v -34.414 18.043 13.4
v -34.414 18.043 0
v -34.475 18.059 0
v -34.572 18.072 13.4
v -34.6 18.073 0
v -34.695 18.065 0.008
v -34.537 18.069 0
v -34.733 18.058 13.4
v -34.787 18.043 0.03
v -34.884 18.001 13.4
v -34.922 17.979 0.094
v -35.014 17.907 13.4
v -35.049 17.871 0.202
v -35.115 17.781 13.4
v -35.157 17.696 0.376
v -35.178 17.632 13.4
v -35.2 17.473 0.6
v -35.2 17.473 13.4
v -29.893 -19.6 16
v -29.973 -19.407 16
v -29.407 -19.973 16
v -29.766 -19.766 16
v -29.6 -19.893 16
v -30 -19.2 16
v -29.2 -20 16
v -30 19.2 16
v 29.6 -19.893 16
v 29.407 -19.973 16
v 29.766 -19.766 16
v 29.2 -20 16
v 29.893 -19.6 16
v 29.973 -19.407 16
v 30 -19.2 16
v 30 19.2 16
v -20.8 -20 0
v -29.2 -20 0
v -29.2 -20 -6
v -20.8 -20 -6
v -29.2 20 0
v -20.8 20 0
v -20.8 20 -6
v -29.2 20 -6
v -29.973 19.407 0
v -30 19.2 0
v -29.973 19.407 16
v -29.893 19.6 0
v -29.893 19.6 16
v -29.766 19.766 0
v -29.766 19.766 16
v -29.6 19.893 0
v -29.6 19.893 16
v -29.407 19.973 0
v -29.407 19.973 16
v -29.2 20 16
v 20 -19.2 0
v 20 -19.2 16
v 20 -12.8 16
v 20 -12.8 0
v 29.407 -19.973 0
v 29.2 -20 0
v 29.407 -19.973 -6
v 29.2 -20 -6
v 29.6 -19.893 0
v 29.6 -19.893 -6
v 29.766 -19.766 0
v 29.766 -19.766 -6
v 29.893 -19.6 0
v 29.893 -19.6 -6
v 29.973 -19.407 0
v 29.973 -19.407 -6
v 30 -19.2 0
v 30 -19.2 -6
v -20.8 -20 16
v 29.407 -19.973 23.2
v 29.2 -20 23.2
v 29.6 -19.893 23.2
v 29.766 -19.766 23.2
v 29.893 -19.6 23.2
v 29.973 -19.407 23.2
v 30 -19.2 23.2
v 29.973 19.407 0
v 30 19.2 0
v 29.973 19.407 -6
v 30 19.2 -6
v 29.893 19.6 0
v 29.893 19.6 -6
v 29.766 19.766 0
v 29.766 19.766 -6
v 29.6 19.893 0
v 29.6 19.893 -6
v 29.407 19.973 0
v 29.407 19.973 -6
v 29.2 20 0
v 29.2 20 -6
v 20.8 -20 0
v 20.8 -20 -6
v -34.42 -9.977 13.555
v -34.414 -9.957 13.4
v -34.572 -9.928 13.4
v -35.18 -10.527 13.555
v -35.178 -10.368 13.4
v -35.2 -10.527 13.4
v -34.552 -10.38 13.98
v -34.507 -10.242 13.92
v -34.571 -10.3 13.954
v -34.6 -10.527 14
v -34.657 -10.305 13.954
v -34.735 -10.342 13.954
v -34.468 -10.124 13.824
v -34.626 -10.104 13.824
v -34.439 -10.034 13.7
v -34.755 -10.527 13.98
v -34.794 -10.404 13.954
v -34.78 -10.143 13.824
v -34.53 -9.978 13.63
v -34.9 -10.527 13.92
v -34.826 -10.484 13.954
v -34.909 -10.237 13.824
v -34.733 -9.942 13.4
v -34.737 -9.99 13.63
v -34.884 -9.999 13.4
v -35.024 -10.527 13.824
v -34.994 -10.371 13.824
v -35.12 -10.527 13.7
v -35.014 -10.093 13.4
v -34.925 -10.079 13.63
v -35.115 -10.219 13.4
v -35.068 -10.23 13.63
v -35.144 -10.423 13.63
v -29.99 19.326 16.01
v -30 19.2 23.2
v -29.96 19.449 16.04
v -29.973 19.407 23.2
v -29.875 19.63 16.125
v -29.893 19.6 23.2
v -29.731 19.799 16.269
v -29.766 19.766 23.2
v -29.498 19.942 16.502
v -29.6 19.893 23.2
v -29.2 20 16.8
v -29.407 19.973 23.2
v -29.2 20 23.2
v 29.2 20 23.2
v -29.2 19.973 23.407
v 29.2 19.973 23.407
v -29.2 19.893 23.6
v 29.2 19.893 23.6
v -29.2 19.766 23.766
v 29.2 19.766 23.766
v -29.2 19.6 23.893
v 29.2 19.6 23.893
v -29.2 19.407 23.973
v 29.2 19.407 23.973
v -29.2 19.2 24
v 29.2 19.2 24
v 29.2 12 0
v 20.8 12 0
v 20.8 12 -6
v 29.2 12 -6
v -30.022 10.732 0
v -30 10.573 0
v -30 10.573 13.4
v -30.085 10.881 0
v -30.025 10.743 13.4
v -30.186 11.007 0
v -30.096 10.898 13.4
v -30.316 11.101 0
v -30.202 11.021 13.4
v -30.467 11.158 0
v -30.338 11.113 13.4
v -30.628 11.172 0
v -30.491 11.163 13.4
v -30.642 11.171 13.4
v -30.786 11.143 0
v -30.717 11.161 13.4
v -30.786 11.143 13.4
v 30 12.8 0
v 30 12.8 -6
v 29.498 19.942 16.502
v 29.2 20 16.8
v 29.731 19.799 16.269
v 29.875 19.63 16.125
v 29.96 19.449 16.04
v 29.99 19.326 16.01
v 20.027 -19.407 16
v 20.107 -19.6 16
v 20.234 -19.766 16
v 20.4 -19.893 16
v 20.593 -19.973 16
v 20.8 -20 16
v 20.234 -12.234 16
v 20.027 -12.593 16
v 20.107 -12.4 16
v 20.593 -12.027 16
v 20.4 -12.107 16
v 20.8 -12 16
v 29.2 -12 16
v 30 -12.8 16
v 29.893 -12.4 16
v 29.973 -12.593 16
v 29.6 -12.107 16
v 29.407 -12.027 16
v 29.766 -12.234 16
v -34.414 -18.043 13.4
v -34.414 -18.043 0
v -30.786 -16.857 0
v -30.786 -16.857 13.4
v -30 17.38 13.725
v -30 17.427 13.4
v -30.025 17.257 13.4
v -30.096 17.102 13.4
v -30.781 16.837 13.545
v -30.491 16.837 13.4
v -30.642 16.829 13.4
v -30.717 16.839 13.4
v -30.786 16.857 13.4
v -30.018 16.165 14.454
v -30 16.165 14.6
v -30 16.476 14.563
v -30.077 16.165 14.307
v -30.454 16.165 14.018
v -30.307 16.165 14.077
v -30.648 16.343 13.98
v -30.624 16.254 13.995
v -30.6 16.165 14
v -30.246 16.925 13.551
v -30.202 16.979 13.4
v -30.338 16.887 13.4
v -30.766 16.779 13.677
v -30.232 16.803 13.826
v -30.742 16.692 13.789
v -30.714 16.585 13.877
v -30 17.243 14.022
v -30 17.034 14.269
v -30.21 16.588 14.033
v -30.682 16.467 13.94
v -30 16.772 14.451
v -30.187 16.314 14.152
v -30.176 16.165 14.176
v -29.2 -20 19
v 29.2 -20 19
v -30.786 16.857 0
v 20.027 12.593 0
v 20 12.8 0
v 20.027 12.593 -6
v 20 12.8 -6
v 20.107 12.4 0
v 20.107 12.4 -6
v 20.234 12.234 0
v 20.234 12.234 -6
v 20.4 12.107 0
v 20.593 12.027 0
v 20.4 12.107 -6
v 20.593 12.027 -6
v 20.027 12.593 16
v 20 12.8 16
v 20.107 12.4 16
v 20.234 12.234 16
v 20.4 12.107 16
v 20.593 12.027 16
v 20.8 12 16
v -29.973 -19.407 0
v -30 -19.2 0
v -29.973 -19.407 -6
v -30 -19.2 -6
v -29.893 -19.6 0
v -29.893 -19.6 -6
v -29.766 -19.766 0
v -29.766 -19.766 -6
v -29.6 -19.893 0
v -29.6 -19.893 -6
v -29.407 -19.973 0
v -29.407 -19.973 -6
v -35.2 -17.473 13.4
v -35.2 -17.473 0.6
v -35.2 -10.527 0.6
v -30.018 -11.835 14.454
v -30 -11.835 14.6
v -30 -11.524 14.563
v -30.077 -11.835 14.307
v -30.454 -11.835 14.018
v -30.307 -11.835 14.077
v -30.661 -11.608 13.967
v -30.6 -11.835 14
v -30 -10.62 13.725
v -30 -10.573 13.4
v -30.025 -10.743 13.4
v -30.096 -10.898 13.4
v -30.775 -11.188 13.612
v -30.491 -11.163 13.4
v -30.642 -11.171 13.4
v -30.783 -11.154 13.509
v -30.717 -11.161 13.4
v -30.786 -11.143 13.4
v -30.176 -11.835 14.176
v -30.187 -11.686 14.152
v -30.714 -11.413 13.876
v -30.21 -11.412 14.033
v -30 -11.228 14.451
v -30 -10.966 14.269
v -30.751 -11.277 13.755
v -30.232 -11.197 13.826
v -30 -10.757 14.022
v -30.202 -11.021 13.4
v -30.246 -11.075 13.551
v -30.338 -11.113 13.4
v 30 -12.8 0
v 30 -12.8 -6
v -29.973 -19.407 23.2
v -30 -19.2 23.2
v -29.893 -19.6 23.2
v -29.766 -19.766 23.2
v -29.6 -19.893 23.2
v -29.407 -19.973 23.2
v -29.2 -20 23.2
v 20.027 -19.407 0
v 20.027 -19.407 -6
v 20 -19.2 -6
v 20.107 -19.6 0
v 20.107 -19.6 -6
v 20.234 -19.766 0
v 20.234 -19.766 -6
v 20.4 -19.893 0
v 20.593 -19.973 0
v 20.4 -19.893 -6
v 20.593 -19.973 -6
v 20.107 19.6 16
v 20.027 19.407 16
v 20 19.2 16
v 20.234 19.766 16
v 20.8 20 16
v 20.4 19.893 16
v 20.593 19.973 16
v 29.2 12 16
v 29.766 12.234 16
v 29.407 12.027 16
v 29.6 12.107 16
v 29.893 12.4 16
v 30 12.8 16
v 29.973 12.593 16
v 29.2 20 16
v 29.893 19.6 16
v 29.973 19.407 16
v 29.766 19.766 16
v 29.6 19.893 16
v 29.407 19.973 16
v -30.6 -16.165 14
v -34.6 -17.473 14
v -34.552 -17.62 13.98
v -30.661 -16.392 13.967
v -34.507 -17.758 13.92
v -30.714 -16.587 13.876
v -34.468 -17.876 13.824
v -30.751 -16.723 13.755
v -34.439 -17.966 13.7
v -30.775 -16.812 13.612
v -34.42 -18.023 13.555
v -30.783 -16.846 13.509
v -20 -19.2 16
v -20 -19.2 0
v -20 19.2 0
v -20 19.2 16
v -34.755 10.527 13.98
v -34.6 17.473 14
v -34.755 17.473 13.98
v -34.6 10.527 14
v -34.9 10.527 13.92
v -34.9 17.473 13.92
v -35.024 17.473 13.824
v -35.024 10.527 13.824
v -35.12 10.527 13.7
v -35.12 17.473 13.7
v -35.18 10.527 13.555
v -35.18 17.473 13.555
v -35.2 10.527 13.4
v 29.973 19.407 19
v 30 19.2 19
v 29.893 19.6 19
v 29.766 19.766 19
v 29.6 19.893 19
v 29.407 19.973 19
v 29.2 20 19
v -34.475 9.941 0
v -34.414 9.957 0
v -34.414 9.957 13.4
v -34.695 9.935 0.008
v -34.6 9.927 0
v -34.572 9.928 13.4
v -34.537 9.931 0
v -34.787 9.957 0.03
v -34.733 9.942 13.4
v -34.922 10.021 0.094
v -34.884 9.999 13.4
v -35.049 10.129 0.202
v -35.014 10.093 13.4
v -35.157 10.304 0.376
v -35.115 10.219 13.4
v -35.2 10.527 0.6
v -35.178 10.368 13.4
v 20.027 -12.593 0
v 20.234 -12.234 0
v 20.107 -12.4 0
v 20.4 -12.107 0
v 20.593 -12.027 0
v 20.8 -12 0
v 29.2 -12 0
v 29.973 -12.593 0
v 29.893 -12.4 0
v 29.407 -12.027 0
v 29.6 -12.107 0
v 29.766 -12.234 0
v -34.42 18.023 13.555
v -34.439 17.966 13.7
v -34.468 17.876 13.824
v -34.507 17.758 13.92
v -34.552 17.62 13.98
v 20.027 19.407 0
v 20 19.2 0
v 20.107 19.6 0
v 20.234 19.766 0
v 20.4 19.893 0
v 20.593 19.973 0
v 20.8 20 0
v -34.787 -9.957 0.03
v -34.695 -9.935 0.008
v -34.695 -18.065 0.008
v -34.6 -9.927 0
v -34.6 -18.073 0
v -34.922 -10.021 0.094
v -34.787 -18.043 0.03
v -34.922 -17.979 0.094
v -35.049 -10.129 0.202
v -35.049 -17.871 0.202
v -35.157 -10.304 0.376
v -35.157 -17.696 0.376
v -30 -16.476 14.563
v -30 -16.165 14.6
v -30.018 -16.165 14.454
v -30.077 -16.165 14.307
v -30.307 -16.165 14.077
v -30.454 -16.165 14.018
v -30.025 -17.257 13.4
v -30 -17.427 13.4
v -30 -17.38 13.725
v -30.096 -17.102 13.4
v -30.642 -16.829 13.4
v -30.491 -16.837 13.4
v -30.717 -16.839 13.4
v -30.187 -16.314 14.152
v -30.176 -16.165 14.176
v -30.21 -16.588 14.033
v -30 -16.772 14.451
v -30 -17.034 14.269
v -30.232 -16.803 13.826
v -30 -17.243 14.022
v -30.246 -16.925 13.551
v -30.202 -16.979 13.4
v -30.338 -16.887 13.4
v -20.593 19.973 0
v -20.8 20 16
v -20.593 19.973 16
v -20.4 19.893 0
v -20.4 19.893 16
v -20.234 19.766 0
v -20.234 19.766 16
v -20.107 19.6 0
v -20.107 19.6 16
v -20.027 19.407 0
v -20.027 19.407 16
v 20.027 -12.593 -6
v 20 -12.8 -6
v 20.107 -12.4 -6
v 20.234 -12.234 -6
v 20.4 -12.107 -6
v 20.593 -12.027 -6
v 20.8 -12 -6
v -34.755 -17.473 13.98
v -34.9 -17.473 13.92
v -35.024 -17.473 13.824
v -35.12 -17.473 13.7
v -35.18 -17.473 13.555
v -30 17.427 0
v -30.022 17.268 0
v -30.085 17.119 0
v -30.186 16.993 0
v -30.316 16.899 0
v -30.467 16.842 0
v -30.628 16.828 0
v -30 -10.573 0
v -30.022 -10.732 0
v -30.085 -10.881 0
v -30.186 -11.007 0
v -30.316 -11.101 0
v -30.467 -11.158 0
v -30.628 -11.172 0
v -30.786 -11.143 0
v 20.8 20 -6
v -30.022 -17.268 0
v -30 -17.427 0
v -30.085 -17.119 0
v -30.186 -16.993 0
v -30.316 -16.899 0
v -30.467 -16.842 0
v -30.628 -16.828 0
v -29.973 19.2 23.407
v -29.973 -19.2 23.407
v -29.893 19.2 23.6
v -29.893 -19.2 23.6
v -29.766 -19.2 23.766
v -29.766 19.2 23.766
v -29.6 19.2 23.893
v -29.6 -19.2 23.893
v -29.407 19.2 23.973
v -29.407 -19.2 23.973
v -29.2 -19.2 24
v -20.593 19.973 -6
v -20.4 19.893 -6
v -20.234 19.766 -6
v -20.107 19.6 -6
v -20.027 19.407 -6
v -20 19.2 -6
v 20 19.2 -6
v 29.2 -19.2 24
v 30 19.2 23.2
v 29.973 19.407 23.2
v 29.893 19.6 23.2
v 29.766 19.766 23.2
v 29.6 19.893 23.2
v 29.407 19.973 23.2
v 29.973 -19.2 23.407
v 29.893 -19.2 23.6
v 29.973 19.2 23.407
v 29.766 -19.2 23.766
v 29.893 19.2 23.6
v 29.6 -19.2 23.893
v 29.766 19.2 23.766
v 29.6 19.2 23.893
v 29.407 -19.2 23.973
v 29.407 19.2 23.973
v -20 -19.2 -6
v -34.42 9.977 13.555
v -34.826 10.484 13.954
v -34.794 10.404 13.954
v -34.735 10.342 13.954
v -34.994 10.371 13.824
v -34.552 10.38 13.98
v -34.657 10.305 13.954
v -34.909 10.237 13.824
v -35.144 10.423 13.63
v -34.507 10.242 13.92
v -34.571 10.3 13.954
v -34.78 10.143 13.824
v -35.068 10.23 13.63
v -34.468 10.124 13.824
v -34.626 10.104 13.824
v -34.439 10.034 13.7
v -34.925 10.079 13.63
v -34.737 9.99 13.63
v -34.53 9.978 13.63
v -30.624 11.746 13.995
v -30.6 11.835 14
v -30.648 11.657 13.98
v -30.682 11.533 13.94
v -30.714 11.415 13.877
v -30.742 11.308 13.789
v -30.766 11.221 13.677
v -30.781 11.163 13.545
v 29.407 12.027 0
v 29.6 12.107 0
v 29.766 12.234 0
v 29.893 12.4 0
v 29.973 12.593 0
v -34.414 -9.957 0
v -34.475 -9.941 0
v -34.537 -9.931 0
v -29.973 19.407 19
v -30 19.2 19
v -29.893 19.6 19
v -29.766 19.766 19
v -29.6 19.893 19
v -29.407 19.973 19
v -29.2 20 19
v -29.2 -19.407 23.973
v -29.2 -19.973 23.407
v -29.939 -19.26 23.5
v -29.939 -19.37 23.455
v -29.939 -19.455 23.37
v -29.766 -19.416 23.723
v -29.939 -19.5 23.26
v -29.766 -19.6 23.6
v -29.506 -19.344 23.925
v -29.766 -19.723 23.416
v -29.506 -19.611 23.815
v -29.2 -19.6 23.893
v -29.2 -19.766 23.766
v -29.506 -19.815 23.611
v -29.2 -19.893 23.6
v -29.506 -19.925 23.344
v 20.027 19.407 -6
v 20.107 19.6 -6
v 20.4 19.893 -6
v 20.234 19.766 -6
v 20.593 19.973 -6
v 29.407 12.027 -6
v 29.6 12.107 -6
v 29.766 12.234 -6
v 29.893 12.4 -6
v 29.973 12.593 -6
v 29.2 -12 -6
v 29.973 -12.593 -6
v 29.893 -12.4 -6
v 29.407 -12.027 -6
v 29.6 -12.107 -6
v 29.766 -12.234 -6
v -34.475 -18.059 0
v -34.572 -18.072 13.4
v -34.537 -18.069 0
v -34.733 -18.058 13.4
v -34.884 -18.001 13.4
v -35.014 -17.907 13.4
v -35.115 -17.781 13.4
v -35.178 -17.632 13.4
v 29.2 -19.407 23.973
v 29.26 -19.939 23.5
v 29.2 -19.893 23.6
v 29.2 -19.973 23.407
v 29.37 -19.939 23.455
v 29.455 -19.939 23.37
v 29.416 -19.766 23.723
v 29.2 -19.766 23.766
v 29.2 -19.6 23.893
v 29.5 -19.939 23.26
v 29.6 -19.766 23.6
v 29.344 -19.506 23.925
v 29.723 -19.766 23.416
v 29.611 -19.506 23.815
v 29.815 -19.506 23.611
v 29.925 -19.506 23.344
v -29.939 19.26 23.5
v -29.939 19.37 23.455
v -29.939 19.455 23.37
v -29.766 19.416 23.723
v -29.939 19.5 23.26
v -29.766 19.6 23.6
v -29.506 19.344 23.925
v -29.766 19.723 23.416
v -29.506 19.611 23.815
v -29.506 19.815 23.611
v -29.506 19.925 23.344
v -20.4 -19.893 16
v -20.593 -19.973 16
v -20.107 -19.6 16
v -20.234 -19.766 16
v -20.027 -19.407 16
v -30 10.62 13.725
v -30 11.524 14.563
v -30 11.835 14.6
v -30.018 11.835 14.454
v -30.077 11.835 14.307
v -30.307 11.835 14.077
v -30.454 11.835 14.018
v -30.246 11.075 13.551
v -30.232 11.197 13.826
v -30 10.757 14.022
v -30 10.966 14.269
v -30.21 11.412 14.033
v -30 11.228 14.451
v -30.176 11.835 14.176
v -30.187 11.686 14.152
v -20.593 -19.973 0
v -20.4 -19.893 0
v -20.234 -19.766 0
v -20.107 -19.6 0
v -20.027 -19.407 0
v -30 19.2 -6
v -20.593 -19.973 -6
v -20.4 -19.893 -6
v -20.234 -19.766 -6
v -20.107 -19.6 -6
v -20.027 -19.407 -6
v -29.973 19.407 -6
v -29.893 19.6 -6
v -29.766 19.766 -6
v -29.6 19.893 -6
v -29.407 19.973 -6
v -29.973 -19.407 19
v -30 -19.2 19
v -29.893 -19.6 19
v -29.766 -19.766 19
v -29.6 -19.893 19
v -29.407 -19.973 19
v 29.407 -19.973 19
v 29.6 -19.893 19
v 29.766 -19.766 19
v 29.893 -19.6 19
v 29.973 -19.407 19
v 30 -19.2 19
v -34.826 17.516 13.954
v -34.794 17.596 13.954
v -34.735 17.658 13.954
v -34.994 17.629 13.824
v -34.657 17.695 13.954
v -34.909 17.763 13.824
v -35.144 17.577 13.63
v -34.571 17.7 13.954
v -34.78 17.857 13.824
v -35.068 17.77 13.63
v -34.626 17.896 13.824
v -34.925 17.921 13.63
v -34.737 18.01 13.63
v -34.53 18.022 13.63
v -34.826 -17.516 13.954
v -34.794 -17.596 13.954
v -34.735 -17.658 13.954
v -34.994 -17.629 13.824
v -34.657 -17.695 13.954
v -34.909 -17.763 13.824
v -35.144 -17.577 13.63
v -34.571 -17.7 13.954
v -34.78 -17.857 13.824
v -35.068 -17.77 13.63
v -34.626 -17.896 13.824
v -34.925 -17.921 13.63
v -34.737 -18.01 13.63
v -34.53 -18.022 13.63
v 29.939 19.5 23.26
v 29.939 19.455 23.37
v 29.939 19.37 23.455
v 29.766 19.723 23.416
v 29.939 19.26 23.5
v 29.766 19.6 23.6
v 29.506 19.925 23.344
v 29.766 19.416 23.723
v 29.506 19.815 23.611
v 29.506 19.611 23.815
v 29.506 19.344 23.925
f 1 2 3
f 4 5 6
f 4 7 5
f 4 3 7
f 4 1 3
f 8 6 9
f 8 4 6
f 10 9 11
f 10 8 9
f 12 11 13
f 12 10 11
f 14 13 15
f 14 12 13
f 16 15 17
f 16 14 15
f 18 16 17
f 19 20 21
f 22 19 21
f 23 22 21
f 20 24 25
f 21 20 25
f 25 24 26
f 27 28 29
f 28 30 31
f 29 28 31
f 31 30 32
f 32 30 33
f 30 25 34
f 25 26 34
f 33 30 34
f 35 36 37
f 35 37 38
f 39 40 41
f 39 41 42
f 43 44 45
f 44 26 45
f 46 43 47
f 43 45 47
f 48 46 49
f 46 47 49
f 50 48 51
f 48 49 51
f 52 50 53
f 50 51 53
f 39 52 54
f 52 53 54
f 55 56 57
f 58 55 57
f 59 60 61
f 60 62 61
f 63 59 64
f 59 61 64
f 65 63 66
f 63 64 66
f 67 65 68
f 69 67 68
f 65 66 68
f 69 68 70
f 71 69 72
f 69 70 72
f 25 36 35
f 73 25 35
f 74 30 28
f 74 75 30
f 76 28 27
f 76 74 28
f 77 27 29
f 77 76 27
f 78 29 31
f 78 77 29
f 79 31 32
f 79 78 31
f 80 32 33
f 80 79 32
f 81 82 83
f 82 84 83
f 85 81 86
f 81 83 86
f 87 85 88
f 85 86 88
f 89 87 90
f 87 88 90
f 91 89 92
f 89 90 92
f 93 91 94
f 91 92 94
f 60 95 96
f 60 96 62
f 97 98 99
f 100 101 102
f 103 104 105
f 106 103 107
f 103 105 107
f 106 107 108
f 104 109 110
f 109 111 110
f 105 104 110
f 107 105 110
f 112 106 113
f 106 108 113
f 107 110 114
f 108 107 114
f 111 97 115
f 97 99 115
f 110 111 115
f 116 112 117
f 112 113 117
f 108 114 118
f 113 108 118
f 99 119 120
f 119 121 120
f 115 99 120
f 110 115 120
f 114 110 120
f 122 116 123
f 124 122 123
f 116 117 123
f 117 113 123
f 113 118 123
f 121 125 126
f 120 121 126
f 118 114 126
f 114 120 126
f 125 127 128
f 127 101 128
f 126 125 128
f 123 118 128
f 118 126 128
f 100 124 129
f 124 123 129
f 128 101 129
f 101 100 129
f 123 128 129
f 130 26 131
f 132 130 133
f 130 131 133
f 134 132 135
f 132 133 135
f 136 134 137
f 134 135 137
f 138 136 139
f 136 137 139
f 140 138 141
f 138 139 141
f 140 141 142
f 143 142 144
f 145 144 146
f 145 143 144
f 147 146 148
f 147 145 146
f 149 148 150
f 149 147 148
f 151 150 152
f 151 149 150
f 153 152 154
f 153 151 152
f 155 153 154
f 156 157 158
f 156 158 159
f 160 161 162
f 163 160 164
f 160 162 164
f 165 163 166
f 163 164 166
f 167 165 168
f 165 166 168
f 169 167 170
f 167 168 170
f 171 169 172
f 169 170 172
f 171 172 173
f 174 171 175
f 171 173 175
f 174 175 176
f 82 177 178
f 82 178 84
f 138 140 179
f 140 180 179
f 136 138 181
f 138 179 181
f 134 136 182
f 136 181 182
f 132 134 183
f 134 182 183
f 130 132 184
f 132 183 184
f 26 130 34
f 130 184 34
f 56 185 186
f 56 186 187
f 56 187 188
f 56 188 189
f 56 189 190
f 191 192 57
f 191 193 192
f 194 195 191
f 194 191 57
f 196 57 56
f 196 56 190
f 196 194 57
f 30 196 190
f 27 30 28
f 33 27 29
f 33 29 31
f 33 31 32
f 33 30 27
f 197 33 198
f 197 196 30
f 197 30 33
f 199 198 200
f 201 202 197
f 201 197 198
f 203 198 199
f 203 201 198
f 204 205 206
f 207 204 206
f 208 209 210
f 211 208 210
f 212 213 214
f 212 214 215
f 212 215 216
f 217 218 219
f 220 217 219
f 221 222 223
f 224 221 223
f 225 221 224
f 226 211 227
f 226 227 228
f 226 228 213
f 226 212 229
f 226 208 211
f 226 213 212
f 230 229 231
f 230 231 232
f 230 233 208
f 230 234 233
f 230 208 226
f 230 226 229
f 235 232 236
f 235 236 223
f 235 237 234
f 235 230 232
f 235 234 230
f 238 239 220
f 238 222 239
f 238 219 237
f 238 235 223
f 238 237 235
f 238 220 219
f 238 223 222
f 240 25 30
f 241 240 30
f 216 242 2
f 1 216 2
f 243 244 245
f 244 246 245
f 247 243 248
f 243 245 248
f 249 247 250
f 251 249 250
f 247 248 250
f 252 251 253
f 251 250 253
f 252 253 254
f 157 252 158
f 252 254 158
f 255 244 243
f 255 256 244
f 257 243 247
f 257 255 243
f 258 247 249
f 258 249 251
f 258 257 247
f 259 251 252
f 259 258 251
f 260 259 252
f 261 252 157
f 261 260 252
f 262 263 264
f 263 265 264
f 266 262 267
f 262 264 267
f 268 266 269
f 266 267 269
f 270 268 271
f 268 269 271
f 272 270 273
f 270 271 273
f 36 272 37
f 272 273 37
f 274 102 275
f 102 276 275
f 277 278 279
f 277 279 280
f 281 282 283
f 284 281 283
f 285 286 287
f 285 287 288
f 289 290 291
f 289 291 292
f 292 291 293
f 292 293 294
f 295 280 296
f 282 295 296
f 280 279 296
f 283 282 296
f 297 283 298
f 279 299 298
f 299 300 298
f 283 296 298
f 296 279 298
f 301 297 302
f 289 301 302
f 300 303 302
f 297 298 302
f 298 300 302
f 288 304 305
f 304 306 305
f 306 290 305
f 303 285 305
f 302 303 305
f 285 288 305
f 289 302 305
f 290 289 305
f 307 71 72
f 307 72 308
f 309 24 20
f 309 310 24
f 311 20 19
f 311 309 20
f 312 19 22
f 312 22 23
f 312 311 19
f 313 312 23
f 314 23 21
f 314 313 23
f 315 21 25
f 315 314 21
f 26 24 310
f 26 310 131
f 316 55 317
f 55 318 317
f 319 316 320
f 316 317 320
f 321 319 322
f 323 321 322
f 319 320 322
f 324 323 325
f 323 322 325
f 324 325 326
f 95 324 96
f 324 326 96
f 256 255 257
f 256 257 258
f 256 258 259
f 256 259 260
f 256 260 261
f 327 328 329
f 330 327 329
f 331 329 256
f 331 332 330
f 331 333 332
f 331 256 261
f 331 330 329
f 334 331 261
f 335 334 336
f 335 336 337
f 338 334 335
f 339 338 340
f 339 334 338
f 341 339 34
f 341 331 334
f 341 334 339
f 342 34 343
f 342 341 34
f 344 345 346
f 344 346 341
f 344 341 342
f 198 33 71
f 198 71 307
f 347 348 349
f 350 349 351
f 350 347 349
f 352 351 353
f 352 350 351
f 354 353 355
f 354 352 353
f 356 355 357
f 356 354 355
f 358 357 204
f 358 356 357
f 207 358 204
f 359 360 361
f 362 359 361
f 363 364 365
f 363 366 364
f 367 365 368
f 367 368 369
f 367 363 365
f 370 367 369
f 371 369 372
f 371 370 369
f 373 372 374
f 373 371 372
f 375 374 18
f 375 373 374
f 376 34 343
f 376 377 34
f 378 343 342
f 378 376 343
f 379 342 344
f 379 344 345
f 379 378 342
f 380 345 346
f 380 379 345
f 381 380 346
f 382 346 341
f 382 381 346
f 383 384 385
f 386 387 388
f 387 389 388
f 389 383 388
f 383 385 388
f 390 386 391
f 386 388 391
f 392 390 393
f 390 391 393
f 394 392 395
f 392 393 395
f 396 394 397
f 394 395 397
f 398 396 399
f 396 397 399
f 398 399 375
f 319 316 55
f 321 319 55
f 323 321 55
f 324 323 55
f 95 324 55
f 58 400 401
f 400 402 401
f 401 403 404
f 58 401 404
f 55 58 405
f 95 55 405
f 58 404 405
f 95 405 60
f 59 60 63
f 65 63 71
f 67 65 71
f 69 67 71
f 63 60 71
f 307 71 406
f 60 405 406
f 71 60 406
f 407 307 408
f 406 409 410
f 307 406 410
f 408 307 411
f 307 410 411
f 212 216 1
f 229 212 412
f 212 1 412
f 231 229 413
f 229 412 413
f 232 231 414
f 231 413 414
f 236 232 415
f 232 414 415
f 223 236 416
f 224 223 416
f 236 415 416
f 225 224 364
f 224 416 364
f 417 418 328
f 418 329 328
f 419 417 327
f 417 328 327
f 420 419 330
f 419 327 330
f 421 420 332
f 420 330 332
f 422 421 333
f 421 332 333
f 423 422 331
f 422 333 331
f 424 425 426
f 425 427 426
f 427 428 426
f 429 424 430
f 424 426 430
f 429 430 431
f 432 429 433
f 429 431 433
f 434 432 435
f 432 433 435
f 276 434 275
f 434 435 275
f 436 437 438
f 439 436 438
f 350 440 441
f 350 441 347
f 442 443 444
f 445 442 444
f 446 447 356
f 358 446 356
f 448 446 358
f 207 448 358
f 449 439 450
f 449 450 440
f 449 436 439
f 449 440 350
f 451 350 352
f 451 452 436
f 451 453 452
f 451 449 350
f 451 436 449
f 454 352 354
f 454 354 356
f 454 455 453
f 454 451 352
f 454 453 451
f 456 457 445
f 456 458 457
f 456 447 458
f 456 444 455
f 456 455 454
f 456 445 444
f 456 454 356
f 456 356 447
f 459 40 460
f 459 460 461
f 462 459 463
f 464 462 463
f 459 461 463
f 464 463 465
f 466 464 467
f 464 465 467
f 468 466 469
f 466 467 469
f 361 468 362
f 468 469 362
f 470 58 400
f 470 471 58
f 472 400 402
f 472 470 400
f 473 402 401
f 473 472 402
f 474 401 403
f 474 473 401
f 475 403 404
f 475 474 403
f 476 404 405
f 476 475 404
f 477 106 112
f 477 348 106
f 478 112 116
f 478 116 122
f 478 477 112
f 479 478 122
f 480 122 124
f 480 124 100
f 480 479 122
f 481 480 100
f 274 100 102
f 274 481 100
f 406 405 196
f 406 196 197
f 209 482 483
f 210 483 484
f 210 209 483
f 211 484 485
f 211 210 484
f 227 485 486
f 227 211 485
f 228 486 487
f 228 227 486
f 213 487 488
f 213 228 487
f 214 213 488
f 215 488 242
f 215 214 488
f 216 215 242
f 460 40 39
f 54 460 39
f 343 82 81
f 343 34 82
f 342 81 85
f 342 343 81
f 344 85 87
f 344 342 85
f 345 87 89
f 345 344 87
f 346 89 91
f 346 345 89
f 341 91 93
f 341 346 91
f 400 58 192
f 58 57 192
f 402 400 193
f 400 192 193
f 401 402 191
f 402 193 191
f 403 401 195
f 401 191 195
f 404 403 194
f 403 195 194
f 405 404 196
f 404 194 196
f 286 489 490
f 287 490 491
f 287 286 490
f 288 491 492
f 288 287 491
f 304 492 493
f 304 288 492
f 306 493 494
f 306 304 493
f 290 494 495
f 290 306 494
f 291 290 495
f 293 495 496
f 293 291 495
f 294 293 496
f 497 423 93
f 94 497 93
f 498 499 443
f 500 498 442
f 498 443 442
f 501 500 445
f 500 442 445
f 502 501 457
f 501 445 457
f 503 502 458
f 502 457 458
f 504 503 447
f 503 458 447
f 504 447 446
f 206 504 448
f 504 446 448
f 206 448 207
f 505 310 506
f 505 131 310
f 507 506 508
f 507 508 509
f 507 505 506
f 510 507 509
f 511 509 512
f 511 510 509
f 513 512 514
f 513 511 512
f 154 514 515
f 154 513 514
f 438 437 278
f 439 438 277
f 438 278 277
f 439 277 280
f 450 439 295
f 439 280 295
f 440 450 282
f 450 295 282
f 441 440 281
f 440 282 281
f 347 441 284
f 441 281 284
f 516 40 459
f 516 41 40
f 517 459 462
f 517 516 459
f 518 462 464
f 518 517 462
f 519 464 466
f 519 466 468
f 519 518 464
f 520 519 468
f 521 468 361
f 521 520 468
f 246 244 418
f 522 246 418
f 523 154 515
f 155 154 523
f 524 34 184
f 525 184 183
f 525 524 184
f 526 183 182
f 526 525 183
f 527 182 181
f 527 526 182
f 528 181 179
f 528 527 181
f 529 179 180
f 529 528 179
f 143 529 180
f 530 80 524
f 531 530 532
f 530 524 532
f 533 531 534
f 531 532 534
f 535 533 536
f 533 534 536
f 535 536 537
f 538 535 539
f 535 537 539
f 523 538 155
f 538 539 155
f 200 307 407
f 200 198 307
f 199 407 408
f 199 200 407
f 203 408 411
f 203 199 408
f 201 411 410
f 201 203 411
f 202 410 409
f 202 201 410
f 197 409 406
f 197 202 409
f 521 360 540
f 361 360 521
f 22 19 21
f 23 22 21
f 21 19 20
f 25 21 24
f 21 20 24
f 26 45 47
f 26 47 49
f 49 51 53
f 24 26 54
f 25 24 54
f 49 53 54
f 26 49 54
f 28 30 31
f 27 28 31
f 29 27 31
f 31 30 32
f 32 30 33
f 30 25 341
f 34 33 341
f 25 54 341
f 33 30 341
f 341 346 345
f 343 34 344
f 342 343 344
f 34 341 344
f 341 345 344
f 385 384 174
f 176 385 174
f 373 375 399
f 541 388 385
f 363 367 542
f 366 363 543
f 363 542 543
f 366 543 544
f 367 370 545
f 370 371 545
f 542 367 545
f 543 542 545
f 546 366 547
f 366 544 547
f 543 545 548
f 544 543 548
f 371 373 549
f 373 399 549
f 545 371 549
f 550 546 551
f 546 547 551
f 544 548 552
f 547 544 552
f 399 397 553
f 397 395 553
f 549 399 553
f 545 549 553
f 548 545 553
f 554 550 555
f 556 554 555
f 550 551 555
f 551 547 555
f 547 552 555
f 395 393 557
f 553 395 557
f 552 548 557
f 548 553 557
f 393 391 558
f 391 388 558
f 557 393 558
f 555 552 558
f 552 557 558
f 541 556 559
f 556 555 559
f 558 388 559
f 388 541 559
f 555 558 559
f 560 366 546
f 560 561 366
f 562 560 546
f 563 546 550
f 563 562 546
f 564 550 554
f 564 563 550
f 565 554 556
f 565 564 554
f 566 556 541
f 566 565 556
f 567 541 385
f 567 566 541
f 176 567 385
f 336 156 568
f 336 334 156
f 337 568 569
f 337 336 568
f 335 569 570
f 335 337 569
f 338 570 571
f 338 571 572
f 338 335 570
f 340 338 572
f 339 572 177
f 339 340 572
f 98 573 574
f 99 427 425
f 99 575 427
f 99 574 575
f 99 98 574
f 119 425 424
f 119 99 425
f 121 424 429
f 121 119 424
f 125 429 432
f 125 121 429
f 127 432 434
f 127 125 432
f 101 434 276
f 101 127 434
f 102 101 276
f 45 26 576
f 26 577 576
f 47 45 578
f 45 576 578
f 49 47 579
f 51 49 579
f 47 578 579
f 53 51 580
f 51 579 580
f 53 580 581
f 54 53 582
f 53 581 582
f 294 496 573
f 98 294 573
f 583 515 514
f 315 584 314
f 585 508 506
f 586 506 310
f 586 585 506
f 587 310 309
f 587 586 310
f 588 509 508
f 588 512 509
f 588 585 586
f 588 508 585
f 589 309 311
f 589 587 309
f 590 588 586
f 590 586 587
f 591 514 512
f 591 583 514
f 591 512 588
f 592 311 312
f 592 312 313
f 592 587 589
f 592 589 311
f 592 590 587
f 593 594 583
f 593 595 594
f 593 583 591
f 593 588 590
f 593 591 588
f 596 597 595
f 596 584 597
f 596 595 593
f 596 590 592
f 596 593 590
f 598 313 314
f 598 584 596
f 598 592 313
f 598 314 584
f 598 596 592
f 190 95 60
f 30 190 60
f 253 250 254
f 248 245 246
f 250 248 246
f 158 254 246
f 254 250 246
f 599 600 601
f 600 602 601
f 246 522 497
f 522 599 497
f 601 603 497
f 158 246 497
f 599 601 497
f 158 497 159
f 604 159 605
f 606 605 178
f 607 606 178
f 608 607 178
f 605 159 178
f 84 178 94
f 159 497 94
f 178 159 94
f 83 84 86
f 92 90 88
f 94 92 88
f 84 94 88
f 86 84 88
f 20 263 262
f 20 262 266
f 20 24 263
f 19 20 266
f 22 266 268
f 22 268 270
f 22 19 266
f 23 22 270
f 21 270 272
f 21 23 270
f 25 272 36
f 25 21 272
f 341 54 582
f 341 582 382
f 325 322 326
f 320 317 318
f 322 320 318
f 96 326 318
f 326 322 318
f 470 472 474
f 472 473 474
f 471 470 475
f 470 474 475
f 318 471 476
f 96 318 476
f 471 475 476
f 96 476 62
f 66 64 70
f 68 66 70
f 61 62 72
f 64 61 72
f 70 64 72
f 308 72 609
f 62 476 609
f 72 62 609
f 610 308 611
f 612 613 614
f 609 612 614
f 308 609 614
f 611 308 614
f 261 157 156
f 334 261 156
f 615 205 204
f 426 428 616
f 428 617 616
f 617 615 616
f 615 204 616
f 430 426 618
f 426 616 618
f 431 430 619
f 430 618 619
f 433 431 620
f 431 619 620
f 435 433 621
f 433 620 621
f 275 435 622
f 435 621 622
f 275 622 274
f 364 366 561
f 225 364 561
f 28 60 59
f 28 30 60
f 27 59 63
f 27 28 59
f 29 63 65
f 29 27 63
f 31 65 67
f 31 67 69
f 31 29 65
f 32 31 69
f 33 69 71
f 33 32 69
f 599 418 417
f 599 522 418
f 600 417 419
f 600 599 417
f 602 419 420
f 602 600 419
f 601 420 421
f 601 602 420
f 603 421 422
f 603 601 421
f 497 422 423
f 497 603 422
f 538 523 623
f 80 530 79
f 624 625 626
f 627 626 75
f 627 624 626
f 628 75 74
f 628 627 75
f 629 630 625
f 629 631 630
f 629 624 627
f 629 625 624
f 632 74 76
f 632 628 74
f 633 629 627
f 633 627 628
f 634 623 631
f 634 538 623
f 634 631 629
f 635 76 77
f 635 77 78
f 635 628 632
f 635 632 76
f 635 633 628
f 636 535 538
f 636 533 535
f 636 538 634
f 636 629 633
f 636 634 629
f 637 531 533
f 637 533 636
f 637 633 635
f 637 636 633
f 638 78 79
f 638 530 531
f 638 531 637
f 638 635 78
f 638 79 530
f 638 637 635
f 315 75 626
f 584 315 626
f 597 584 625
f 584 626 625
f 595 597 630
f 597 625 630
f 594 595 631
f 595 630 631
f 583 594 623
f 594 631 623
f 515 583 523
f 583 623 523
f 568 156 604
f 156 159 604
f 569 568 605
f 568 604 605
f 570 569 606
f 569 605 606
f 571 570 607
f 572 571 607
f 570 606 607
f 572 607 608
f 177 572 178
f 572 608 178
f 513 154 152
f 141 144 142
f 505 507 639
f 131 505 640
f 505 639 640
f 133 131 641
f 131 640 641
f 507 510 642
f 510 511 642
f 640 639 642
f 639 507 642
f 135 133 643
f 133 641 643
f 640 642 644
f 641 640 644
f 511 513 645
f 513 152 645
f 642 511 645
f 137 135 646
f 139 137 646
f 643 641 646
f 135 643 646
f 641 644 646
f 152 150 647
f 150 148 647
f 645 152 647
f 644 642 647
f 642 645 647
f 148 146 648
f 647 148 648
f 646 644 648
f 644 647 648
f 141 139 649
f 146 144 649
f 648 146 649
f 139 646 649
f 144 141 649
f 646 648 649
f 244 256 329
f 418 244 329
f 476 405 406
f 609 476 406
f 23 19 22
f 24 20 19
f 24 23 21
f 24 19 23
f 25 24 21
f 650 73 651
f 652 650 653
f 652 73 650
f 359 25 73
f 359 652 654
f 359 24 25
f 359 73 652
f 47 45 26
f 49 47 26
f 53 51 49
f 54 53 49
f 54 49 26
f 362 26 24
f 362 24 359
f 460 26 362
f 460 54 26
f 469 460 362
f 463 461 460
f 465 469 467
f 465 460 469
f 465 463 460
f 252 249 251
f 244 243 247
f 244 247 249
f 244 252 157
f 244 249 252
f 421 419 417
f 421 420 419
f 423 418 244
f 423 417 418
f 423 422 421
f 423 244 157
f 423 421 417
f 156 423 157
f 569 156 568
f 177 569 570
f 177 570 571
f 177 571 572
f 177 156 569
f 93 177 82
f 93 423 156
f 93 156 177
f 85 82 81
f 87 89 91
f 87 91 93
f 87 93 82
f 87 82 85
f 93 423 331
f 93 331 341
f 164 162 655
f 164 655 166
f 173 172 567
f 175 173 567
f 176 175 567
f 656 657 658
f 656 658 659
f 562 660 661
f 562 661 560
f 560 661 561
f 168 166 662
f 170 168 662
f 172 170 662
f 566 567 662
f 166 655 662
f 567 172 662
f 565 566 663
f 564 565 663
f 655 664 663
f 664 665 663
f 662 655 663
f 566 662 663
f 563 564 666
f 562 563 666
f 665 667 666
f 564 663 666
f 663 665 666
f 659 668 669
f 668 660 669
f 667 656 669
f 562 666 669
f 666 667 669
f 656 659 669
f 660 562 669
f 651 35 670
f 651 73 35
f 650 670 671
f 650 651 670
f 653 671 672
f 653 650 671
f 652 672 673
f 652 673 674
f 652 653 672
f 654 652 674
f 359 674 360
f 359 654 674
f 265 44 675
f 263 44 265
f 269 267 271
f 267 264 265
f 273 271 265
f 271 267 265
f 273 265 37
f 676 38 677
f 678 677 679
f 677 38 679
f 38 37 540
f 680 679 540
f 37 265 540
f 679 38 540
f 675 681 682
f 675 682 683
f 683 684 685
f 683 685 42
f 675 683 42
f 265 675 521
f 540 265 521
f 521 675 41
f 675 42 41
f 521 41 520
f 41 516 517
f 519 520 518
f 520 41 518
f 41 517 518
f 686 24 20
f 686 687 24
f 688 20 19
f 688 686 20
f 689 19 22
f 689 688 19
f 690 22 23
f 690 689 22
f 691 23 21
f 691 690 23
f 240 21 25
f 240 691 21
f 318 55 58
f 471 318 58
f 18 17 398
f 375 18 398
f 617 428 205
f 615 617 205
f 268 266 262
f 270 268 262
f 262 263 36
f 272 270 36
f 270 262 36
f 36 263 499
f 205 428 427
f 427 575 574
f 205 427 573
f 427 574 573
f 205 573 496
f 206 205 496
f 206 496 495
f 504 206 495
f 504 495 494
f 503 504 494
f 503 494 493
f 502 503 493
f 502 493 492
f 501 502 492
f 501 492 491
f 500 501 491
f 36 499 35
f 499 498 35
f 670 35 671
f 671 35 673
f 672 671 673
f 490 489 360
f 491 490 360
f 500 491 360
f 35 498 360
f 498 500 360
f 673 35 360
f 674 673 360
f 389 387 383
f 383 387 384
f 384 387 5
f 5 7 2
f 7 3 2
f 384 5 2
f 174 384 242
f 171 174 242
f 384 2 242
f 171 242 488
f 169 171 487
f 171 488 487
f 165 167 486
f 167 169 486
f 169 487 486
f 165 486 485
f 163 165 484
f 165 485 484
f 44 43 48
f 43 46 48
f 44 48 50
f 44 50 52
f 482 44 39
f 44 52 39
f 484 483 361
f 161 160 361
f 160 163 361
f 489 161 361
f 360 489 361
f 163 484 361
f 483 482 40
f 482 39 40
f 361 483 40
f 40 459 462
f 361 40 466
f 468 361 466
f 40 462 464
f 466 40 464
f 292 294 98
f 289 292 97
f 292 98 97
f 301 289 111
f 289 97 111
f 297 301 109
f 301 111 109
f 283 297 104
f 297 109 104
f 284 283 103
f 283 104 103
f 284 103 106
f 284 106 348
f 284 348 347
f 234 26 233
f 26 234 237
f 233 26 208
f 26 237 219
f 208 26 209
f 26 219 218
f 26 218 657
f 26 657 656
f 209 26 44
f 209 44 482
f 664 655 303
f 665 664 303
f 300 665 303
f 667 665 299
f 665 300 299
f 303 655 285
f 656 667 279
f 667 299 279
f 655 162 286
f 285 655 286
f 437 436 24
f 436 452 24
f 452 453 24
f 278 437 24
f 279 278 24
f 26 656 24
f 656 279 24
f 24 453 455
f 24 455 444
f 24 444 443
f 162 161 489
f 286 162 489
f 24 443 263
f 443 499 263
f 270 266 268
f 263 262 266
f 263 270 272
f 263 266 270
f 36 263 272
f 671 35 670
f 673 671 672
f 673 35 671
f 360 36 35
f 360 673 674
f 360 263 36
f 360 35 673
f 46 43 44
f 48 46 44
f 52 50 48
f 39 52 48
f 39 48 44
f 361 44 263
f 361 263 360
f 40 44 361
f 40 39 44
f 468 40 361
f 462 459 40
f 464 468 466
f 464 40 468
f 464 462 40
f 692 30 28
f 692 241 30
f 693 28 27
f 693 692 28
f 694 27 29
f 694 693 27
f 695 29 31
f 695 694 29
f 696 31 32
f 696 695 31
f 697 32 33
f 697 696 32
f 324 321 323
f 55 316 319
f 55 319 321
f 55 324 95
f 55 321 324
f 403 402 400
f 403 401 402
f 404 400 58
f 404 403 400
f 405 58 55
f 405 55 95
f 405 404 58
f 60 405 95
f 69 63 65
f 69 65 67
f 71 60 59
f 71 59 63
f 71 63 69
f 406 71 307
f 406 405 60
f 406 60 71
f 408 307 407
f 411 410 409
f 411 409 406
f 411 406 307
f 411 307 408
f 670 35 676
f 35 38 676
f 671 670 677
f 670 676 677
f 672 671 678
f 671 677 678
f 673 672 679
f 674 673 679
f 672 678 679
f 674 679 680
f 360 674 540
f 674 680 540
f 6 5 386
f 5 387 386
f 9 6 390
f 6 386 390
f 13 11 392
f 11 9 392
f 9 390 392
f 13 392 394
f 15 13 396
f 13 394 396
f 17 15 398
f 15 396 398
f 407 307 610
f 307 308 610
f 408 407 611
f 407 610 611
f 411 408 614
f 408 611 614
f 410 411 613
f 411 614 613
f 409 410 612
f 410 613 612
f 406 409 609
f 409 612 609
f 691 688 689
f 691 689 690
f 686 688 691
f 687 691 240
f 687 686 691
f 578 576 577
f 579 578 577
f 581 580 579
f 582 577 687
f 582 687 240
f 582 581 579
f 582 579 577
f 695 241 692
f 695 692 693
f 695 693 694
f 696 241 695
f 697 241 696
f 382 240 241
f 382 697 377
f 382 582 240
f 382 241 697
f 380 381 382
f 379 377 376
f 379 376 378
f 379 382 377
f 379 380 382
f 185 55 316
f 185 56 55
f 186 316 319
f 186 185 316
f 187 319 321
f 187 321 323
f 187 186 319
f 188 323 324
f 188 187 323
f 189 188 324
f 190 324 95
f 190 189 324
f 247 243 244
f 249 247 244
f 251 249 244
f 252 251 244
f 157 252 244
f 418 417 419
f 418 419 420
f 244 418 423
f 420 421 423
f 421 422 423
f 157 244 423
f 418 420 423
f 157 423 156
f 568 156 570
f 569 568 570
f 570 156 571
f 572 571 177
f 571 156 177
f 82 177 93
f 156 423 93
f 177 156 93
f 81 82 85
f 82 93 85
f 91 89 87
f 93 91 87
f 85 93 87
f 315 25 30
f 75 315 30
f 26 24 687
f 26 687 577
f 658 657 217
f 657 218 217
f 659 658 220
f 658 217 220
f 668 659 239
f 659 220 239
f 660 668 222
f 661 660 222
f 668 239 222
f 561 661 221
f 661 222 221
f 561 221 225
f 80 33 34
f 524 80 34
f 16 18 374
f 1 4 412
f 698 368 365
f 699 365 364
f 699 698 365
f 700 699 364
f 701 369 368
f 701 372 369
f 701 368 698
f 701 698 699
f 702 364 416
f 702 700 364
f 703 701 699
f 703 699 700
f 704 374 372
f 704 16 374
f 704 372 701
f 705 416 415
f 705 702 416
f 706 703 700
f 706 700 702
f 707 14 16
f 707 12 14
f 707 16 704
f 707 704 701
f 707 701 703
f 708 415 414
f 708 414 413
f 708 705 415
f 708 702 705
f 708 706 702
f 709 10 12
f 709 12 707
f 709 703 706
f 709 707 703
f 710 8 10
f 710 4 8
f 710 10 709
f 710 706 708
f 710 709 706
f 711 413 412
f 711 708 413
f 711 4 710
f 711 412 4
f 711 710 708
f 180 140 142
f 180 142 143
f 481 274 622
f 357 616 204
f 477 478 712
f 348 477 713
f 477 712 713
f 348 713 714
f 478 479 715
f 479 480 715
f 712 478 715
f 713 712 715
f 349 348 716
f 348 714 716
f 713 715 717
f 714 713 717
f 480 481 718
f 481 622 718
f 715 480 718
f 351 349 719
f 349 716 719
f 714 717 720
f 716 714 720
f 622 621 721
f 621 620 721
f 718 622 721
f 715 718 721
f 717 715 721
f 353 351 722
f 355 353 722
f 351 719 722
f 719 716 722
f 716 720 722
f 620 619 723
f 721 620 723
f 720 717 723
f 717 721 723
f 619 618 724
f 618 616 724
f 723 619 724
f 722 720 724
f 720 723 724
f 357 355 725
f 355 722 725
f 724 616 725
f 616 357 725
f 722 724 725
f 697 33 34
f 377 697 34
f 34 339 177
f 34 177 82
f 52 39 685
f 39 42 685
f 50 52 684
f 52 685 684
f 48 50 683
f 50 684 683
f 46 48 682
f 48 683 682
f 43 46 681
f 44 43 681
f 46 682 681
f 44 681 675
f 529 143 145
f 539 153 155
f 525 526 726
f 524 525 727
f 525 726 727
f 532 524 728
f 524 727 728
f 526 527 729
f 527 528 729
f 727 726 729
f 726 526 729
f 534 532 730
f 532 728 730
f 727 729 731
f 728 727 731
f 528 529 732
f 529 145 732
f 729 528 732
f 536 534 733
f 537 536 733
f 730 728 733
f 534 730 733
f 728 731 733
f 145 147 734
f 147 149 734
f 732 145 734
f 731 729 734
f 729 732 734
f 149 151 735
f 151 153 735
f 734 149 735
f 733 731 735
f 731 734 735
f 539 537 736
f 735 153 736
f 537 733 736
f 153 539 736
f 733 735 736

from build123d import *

# Parameters (mm, degrees)
F1_DEPTH = 16
F0_W     = 10
F0_H     = 8
F2_DEPTH = 14
F3_W     = 60
F3_H     = 40
F4_DEPTH = 3
F5_DEPTH = 8
F6_DEPTH = 6
F7_R     = 0.6
F8_R     = 0.8
F8_2_R   = 0.8
F8_3_R   = 0.8
F8_4_R   = 0.8
F8_5_R   = 0.8
F8_6_R   = 0.8
F8_7_R   = 0.8
F8_8_R   = 0.8


# Not quite as in the source:
# - a feature names something its author has since deleted; it is built from what else it names


with BuildPart() as f1:
    # F0 (on Top) → F1 (new body)
    with BuildSketch(Plane.XY):
        Polygon((-20, 20), (-30, 20), (-30, 16.6), (-30, 11.4), (-30, -11.4), (-30, -16.6), (-30, -20), (-20, -20), align=None)
    extrude(amount=F1_DEPTH)

    # F0 (on Top) → F2 (join)
    with BuildSketch(Plane.XY):
        Polygon((-30, -16.6), (-30, -11.4), (-35.2, -9.7), (-35.2, -18.3), align=None)
        Polygon((-30, 11.4), (-30, 16.6), (-35.2, 18.3), (-35.2, 9.7), align=None)
    extrude(amount=F2_DEPTH)

    # F7
    f7_edges = [f1.edges().sort_by_distance(p)[0] for p in [
        (-35.2, 18.3, 7),
        (-35.2, 9.7, 7),
        (-35.2, 14, 0),
        (-35.2, 14, 14),
        (-30, 14, 14),
        (-32.6, 17.45, 14),
        (-32.6, 10.55, 14),
        (-32.6, -10.55, 14),
        (-35.2, -14, 14),
        (-32.6, -17.45, 14),
        (-30, -14, 14),
        (-35.2, -9.7, 7),
        (-35.2, -18.3, 7),
        (-35.2, -14, 0),
        (-30, 16.6, 7),
        (-30, 11.4, 7),
        (-30, -11.4, 7),
        (-30, -16.6, 7),
    ]]
    fillet(f7_edges, radius=F7_R)

    # F8
    f8_edges = [f1.edges().sort_by_distance(p)[0] for p in [
        (-20, 20, 8),
        (-30, 20, 8),
        (-30, -20, 8),
        (-20, -20, 8),
    ]]
    fillet(f8_edges, radius=F8_R)


with BuildPart() as f1b:
    # F0 (on Top) → F1, piece 2 (new body)
    with BuildSketch(Plane.XY):
        with Locations((25, 16)):
            Rectangle(F0_W, F0_H)
    extrude(amount=F1_DEPTH)

    # F8#2
    f8_2_edges = [f1b.edges().sort_by_distance(p)[0] for p in [
        (30, 20, 8),
        (30, 12, 8),
        (20, 12, 8),
        (20, 20, 8),
    ]]
    fillet(f8_2_edges, radius=F8_2_R)


with BuildPart() as f1c:
    # F0 (on Top) → F1, piece 3 (new body)
    with BuildSketch(Plane.XY):
        with Locations((25, -16)):
            Rectangle(F0_W, F0_H)
    extrude(amount=F1_DEPTH)

    # F8#3
    f8_3_edges = [f1c.edges().sort_by_distance(p)[0] for p in [
        (30, -20, 8),
        (30, -12, 8),
        (20, -20, 8),
        (20, -12, 8),
    ]]
    fillet(f8_3_edges, radius=F8_3_R)


with BuildPart() as f4:
    # F3 (on face) → F4 (new body)
    with BuildSketch(Plane.XY.offset(16)):
        Rectangle(F3_W, F3_H)
    extrude(amount=F4_DEPTH)

    # F8#4
    f8_4_edges = [f4.edges().sort_by_distance(p)[0] for p in [
        (30, 20, 17.5),
        (30, -20, 17.5),
        (-30, 20, 17.5),
        (-30, -20, 17.5),
    ]]
    fillet(f8_4_edges, radius=F8_4_R)


with BuildPart() as f5:
    # F3 (on face) → F5 (new body)
    with BuildSketch(Plane.XY.offset(16)):
        Rectangle(F3_W, F3_H)
    extrude(amount=F5_DEPTH)

    # F8#5
    f8_5_edges = [f5.edges().sort_by_distance(p)[0] for p in [
        (0, 20, 16),
        (0, 20, 24),
        (30, 20, 20),
        (30, 0, 24),
        (0, -20, 24),
        (-30, 0, 24),
        (-30, -20, 20),
        (-30, 20, 20),
        (30, -20, 20),
    ]]
    fillet(f8_5_edges, radius=F8_5_R)


with BuildPart() as f6:
    # F0 (on Top) → F6 (new body)
    with BuildSketch(Plane.XY):
        Polygon((-20, 20), (-30, 20), (-30, 16.6), (-30, 11.4), (-30, -11.4), (-30, -16.6), (-30, -20), (-20, -20), align=None)
    extrude(amount=-F6_DEPTH)

    # F8#6
    f8_6_edges = [f6.edges().sort_by_distance(p)[0] for p in [
        (-20, 20, -3),
        (-30, 20, -3),
        (-30, -20, -3),
        (-20, -20, -3),
    ]]
    fillet(f8_6_edges, radius=F8_6_R)


with BuildPart() as f6b:
    # F0 (on Top) → F6, piece 2 (new body)
    with BuildSketch(Plane.XY):
        with Locations((25, -16)):
            Rectangle(F0_W, F0_H)
    extrude(amount=-F6_DEPTH)

    # F8#7
    f8_7_edges = [f6b.edges().sort_by_distance(p)[0] for p in [
        (30, -20, -3),
        (30, -12, -3),
        (20, -20, -3),
        (20, -12, -3),
    ]]
    fillet(f8_7_edges, radius=F8_7_R)


with BuildPart() as f6c:
    # F0 (on Top) → F6, piece 3 (new body)
    with BuildSketch(Plane.XY):
        with Locations((25, 16)):
            Rectangle(F0_W, F0_H)
    extrude(amount=-F6_DEPTH)

    # F8#8
    f8_8_edges = [f6c.edges().sort_by_distance(p)[0] for p in [
        (30, 20, -3),
        (30, 12, -3),
        (20, 12, -3),
        (20, 20, -3),
    ]]
    fillet(f8_8_edges, radius=F8_8_R)


solid = Compound([f1.part, f1b.part, f1c.part, f4.part, f5.part, f6.part, f6b.part, f6c.part])
